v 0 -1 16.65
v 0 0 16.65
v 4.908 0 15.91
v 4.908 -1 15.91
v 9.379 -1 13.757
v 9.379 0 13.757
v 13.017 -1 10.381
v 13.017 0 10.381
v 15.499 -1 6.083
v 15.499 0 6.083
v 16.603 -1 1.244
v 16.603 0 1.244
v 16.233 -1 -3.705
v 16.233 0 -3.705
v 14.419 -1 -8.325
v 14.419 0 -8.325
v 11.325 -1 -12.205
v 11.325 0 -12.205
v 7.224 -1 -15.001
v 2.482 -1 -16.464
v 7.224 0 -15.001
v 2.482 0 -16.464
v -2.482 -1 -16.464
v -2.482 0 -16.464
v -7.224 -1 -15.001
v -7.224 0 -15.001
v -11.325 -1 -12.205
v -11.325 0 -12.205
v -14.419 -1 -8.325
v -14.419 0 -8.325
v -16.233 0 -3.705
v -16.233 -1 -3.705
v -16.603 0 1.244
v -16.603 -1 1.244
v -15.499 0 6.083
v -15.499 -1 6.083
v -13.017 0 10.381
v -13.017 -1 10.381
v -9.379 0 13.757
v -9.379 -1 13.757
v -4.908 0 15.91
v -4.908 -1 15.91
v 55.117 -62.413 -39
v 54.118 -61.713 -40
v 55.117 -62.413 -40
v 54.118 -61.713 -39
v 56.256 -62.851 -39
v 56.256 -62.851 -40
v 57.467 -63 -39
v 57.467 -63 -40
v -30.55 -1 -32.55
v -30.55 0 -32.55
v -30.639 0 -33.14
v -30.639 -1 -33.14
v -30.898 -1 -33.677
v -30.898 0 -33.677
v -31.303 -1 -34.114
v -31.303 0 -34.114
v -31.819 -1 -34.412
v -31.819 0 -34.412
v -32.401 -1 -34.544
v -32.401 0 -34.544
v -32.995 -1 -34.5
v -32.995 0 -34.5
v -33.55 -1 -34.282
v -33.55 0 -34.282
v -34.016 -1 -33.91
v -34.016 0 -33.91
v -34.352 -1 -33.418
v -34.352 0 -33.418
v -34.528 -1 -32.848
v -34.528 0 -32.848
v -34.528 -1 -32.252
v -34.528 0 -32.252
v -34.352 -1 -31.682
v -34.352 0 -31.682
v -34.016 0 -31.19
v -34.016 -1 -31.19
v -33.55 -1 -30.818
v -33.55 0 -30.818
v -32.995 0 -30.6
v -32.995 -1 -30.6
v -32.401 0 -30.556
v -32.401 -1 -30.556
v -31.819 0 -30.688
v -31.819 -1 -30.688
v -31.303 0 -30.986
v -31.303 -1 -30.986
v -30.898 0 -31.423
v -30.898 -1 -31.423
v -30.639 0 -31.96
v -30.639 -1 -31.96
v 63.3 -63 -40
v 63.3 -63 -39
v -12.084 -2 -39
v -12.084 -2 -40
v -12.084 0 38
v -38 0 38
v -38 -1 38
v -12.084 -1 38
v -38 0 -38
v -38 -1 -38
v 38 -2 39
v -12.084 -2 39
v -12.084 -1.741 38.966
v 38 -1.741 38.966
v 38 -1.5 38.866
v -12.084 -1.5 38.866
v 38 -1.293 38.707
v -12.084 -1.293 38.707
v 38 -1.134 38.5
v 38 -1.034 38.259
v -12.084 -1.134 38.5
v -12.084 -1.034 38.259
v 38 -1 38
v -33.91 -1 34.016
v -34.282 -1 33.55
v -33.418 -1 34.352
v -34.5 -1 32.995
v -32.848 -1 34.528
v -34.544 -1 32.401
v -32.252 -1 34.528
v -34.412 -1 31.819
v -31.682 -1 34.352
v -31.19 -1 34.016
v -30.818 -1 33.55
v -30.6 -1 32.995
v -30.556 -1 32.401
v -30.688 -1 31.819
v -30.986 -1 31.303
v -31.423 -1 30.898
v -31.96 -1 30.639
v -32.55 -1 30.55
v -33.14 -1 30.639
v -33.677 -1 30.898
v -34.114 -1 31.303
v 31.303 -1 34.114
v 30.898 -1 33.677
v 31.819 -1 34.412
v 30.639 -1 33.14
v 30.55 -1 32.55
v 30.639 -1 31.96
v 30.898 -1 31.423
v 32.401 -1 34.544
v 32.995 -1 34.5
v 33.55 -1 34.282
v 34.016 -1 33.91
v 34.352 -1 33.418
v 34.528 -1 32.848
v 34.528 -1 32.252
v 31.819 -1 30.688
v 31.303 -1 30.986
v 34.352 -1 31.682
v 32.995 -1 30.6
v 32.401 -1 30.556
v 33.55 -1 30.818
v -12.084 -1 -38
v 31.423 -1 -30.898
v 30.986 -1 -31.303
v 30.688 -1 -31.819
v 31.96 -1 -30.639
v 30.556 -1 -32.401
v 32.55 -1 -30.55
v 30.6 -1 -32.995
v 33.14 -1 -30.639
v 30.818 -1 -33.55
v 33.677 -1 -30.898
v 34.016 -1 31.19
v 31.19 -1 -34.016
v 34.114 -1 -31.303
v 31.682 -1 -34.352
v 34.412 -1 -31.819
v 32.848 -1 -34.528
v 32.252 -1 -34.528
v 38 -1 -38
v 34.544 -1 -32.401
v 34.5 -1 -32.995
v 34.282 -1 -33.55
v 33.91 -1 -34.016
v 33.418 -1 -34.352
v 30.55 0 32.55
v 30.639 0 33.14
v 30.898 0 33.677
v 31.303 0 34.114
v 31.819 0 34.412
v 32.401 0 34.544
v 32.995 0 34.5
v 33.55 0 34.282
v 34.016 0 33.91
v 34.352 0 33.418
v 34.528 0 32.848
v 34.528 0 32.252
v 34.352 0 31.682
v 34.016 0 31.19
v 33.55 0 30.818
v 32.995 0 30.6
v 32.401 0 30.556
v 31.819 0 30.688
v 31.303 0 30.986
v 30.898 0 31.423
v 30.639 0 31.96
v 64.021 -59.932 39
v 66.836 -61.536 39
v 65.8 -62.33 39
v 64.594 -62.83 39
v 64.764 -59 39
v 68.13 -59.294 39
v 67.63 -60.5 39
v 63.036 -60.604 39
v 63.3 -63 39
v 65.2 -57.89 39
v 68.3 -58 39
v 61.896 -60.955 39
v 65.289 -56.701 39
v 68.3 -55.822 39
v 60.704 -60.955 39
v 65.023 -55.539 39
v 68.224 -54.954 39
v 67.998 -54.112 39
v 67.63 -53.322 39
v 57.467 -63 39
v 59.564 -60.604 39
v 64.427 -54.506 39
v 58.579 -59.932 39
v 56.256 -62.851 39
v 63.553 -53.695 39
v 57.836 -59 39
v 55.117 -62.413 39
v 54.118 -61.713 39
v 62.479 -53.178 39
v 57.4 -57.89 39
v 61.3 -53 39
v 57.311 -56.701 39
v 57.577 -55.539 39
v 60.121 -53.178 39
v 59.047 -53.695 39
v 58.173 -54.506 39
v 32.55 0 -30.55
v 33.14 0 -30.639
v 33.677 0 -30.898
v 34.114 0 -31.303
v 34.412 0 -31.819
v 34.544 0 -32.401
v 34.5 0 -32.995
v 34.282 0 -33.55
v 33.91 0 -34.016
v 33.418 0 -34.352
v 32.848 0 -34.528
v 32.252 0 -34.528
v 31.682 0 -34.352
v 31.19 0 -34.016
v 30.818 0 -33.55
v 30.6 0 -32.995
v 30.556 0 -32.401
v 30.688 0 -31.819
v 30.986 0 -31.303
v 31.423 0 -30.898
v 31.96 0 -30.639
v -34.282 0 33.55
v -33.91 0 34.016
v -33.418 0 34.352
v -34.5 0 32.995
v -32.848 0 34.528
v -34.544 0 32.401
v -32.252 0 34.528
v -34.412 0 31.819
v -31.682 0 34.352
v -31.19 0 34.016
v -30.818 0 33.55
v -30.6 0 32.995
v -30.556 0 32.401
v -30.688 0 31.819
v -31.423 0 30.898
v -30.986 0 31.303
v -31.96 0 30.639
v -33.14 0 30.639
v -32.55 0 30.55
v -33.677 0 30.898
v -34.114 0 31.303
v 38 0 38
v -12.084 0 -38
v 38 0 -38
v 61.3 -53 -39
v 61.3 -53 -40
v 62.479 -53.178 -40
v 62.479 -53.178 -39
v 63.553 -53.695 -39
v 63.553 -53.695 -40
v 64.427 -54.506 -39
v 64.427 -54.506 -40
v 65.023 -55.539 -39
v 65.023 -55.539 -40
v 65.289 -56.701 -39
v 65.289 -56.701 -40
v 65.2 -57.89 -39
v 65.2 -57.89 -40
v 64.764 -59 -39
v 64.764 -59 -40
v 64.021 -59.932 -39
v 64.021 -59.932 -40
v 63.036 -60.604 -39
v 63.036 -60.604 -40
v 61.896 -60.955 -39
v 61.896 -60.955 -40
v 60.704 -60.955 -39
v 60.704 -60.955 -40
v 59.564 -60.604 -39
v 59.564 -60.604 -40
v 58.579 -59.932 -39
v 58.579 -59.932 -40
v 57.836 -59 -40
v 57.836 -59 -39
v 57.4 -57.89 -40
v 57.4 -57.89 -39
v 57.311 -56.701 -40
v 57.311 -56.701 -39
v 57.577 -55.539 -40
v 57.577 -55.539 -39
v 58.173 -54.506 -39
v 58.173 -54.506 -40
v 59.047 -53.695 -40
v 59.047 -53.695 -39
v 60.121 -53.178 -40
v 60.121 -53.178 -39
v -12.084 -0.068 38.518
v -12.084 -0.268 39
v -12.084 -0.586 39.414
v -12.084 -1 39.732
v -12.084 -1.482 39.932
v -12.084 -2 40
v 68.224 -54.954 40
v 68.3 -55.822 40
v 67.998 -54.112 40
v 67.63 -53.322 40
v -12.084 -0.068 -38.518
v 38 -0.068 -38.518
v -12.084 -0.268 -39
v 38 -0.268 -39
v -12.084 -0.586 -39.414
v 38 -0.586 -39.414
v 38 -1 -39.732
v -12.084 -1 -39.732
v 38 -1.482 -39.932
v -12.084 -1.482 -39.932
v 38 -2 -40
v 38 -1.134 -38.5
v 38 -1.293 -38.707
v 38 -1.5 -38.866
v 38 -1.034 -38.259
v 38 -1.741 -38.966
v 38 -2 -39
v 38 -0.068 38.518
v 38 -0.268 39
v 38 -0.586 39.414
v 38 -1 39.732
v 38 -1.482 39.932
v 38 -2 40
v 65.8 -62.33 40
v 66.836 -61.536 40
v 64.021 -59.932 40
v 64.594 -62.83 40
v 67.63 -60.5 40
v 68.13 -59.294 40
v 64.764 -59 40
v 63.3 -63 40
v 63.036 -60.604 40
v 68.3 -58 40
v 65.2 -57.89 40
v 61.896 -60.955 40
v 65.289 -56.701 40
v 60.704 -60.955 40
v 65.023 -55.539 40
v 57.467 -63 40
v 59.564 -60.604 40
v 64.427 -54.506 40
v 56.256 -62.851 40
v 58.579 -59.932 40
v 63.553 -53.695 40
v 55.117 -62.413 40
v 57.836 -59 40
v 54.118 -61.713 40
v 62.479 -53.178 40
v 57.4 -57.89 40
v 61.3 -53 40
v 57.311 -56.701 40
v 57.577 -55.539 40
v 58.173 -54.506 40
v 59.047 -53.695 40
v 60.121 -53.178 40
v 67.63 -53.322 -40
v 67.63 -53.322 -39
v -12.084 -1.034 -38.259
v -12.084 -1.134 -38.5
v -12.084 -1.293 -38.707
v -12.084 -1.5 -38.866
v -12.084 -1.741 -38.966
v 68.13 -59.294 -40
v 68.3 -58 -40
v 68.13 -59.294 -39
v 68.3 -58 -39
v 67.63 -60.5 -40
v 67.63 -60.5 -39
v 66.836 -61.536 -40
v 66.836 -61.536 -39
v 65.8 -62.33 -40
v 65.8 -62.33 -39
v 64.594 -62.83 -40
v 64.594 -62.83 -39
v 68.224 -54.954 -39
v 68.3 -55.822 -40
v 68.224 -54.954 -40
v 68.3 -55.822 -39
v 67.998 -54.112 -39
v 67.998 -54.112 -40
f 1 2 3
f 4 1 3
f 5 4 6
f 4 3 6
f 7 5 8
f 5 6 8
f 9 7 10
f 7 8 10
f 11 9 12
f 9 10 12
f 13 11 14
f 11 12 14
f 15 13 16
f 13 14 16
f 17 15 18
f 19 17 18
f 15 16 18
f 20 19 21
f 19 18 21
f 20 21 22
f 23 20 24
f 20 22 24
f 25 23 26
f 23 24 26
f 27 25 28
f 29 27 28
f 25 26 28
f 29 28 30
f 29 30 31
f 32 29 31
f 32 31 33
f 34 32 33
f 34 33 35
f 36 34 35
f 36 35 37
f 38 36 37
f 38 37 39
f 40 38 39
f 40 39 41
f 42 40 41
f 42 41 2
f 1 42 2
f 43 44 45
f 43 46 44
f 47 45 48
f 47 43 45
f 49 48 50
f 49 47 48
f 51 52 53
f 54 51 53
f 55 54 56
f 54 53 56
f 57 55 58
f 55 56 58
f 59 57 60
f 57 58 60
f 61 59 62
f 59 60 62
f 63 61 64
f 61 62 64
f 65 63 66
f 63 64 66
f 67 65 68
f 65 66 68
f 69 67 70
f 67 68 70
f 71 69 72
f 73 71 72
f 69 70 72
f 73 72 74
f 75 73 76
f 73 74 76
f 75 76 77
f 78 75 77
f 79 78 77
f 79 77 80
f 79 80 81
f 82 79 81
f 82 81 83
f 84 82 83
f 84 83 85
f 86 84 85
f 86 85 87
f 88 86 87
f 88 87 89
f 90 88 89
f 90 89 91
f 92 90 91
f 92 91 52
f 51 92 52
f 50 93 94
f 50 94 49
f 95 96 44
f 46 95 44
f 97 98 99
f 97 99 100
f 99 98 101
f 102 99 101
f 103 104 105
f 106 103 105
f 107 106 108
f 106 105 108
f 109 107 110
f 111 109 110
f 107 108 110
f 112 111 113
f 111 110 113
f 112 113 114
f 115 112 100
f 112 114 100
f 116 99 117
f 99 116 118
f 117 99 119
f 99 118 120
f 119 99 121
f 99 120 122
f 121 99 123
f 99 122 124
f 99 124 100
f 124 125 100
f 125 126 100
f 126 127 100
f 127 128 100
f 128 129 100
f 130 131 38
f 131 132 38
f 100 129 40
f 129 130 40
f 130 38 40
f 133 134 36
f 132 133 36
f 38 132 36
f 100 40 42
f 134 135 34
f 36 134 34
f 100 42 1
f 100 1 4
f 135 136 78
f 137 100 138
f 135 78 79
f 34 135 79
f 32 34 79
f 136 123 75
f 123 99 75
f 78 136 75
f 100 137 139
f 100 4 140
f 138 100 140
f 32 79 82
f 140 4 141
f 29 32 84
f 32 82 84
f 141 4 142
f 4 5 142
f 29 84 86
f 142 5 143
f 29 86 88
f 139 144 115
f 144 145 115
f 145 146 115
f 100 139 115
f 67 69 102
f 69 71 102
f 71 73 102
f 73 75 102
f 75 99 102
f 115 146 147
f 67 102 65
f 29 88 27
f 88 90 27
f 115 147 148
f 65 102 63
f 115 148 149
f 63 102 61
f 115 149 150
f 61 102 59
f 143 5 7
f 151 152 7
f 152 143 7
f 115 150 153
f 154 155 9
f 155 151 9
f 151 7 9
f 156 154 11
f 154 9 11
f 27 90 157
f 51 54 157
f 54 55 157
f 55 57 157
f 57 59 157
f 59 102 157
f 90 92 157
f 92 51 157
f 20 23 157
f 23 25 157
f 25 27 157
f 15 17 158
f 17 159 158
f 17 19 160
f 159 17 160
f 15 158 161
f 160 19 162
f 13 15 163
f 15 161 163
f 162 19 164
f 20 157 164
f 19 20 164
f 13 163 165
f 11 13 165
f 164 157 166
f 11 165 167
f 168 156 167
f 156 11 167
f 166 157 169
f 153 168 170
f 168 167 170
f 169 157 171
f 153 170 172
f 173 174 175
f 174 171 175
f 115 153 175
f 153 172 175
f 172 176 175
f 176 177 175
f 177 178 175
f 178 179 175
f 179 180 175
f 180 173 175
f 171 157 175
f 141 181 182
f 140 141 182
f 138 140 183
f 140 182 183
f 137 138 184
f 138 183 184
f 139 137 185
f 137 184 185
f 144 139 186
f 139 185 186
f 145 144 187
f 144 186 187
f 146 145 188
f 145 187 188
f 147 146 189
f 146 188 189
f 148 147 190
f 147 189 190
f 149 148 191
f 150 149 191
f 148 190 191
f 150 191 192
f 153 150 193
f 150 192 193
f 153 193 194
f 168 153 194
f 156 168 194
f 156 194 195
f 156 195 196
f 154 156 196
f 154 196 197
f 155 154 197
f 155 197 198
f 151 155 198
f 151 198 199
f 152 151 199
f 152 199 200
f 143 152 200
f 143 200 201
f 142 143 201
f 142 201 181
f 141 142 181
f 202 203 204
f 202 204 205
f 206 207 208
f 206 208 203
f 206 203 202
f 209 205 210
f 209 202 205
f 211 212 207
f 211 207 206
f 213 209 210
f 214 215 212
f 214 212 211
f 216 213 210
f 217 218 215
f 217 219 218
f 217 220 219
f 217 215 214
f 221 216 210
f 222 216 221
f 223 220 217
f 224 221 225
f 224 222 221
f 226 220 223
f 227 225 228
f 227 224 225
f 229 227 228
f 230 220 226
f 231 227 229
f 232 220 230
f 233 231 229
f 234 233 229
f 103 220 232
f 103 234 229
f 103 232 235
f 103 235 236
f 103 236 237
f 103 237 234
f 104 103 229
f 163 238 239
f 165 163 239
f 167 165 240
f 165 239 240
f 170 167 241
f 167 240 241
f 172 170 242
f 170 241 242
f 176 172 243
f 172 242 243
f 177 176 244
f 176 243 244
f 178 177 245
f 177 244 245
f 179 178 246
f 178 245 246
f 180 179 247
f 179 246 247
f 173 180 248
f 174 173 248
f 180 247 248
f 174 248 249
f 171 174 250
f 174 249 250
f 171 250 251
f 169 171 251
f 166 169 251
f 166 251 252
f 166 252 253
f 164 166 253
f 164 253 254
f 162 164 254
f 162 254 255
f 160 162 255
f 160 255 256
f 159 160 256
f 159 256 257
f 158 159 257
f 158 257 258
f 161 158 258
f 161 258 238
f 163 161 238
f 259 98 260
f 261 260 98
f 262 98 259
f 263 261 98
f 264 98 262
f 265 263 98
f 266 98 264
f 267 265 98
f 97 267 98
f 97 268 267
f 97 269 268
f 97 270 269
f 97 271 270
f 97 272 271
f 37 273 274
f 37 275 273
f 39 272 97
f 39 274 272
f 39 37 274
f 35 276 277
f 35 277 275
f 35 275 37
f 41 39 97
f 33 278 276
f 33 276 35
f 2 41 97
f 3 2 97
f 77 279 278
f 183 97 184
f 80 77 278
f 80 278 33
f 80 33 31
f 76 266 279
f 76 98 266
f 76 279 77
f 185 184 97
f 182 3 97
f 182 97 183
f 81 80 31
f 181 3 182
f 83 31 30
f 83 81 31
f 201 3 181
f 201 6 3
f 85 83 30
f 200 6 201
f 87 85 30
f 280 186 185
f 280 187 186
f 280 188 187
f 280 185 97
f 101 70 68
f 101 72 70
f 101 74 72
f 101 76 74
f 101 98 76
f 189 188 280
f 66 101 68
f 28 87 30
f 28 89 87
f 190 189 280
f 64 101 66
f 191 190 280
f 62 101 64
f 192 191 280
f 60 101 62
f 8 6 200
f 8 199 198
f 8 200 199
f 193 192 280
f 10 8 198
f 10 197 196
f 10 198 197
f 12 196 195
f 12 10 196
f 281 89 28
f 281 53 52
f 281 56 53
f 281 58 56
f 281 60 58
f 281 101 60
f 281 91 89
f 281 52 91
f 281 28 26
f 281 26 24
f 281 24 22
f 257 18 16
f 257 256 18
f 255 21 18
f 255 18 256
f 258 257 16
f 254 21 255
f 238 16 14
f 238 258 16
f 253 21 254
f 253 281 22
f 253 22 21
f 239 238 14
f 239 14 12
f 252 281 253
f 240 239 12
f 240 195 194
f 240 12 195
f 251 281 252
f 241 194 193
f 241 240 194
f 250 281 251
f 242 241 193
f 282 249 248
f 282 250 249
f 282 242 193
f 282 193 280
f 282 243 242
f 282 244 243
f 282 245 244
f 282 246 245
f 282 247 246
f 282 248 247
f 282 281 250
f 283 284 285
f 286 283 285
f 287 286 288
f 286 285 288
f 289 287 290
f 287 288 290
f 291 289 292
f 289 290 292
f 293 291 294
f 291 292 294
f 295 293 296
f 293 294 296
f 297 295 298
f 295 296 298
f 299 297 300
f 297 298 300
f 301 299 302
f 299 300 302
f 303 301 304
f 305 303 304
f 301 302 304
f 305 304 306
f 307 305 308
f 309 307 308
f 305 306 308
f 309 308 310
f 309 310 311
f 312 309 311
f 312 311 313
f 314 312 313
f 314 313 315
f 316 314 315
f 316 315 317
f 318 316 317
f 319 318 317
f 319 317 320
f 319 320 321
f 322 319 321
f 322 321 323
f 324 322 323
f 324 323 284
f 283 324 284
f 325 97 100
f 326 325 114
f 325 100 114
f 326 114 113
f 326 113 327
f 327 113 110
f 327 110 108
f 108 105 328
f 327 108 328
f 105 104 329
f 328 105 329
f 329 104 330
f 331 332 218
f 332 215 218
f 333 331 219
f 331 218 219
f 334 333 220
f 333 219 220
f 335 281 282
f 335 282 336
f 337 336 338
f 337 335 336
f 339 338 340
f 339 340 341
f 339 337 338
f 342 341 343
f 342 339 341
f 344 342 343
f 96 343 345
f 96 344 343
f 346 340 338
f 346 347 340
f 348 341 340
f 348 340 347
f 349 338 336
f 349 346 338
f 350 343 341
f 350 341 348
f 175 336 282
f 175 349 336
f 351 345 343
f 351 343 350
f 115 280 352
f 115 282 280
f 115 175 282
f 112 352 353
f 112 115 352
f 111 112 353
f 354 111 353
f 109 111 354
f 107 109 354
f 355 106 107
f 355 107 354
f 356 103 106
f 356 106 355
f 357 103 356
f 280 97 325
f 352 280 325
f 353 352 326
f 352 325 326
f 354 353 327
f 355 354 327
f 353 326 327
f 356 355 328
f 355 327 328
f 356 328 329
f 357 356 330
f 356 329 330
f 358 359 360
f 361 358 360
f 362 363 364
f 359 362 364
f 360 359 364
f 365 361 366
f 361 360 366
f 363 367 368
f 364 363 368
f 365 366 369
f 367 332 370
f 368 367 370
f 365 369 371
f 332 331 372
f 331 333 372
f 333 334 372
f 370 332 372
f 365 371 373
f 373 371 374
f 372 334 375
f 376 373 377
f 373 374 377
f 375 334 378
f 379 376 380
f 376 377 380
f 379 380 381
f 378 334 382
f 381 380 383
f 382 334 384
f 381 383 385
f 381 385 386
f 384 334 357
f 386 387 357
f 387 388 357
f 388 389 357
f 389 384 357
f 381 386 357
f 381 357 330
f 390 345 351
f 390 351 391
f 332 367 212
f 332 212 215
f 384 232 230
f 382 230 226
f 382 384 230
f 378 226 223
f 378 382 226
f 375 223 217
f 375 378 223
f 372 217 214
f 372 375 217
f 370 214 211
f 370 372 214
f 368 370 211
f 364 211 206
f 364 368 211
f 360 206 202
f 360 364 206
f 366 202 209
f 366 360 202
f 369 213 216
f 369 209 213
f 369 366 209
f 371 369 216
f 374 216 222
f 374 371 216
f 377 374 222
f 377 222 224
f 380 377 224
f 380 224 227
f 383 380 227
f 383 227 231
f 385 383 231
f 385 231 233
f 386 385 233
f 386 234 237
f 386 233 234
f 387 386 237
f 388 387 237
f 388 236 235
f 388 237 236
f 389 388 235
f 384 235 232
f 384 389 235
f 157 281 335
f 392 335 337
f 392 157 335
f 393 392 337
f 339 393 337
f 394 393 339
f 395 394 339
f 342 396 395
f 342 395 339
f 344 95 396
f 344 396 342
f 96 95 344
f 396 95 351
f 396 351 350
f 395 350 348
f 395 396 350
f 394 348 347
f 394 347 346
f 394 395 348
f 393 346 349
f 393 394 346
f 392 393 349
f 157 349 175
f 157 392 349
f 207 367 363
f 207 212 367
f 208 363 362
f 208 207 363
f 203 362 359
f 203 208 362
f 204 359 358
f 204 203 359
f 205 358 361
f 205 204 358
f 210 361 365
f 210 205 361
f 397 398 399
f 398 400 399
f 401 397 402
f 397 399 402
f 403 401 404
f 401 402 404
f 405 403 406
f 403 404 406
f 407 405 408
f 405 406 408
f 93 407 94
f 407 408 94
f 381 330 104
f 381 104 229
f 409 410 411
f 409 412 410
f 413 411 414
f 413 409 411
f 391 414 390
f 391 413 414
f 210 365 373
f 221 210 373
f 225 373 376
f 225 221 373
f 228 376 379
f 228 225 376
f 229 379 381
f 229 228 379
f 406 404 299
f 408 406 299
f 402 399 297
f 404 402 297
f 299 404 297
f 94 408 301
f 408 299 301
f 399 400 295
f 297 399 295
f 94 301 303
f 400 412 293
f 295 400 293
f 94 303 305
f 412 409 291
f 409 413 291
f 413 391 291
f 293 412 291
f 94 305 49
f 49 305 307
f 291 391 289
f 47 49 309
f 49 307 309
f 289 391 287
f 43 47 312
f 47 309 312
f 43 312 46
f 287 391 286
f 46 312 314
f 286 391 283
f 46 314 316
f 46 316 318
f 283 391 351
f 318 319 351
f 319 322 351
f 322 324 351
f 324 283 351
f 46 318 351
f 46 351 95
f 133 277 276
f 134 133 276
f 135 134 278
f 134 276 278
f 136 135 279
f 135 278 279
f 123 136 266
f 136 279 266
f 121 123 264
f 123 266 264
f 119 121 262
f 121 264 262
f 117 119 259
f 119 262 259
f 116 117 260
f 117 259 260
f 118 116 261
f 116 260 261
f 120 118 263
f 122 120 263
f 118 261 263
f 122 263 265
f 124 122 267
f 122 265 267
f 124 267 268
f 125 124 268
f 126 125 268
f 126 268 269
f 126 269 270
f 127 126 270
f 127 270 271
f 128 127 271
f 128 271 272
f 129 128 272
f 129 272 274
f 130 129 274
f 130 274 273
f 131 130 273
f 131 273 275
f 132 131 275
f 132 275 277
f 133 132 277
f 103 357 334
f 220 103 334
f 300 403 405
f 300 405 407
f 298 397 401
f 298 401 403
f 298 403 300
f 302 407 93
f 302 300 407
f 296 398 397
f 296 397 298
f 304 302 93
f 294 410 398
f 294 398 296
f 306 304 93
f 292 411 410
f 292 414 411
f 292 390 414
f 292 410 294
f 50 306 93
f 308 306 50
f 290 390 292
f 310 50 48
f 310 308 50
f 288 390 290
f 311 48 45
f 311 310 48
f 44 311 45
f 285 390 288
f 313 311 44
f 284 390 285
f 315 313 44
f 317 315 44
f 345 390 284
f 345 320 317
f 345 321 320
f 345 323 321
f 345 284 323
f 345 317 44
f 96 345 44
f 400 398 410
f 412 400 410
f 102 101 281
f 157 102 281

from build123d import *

# Parameters (mm, degrees)
SKETCH2_W            = 76
SKETCH2_H            = 76
BASE_FLANGE1_DEPTH   = 1
SKETCH7_R            = 2
SKETCH7_R_2          = 16.65
CUT_EXTRUDE2_DEPTH   = 10
CIRPATTERN1_COUNT    = 4
EDGE_FLANGE1_DEPTH   = 50.083809579
SKETCH14_W           = 30.3
SKETCH14_H           = 61
TAB1_DEPTH           = 1
FILLET1_R            = 5
CUT_EXTRUDE4_DEPTH   = 10
CUT_EXTRUDE5_DEPTH   = 10
FILLET2_R            = 5
SKETCH19_R           = 4
CUT_EXTRUDE6_DEPTH   = 10
FILLET1_OF_MIRROR1_R = 5
FILLET2_OF_MIRROR1_R = 5


# Sheet-metal steps are written as plain solids
with BuildPart() as part:
    # Sketch2 → Base-Flange1 (new body)
    with BuildSketch(Plane(origin=(0, 0, 0), x_dir=(1, 0, 0), z_dir=(0, 1, 0))):
        Rectangle(SKETCH2_W, SKETCH2_H)
    extrude(amount=-BASE_FLANGE1_DEPTH)

    # Sketch7 → Cut-Extrude2 (cut)
    with BuildSketch(Plane(origin=(0, 0, 0), x_dir=(1, 0, 0), z_dir=(0, 1, 0))):
        with Locations(Location((32.55, 32.55, 0), (0, 0, 270))):
            Circle(SKETCH7_R)
        with Locations(Location((0, 0, 0), (0, 0, 270))):
            Circle(SKETCH7_R_2)
    cut_extrude2 = extrude(amount=-CUT_EXTRUDE2_DEPTH, mode=Mode.SUBTRACT)

    # CirPattern1: Cut-Extrude2 ×4 about axis
    cirpattern1_axis = Axis((0, 0, 0), (0, 1, 0))
    for i in range(1, CIRPATTERN1_COUNT):
        add(cut_extrude2.rotate(cirpattern1_axis, i * 360 / CIRPATTERN1_COUNT), mode=Mode.SUBTRACT)

    # Edge-Flange1 section (across the edge) → Edge-Flange1 (add)
    with BuildSketch(Plane(origin=(-12.083809579, -1, -39), x_dir=(0, 0, 1), z_dir=(1, 0, 0))):
        with BuildLine():
            Line((-1, 1), (-1, 62))
            Line((-1, 62), (0, 62))
            Line((0, 62), (0, 1))
            ThreePointArc((0, 1), (0.292893219, 0.292893219), (1, 0))
            Line((1, 0), (1, -1))
            ThreePointArc((1, -1), (-0.414213562, -0.414213562), (-1, 1))
        make_face()
    edge_flange1 = extrude(amount=EDGE_FLANGE1_DEPTH)

    # Sketch14 → Tab1 (add)
    with BuildSketch(Plane(origin=(0, 0, -40), x_dir=(-1, 0, 0), z_dir=(0, 0, -1))):
        with Locations((-53.15, -32.5)):
            Rectangle(SKETCH14_W, SKETCH14_H)
    tab1 = extrude(amount=-TAB1_DEPTH)

    # Fillet1
    fillet1_edges = [part.edges().sort_by_distance(p)[0] for p in [
        (68.3, -63, -39.5),
    ]]
    fillet(fillet1_edges, radius=FILLET1_R)

    # Sketch20 → Cut-Extrude4 (cut)
    with BuildSketch(Plane(origin=(0, 0, -40), x_dir=(-1, 0, 0), z_dir=(0, 0, -1))):
        Polygon((-38, -2), (-68.3, -54.482600826), (-68.3, -2), align=None)
    cut_extrude4 = extrude(amount=-CUT_EXTRUDE4_DEPTH, mode=Mode.SUBTRACT)

    # Sketch21 → Cut-Extrude5 (cut)
    with BuildSketch(Plane(origin=(0, 0, -40), x_dir=(-1, 0, 0), z_dir=(0, 0, -1))):
        Polygon((12.083809579, -2), (-55.544985759, -63), (12.083809579, -63), align=None)
    cut_extrude5 = extrude(amount=-CUT_EXTRUDE5_DEPTH, mode=Mode.SUBTRACT)

    # Fillet2
    fillet2_edges = [part.edges().sort_by_distance(p)[0] for p in [
        (55.544985759, -63, -39.5),
        (68.3, -54.482600826, -39.5),
    ]]
    fillet(fillet2_edges, radius=FILLET2_R)

    # Sketch19 → Cut-Extrude6 (cut)
    with BuildSketch(Plane(origin=(0, 0, -40), x_dir=(-1, 0, 0), z_dir=(0, 0, -1))):
        with Locations(Location((-61.3, -57, 0), (0, 0, 90))):
            Circle(SKETCH19_R)
    cut_extrude6 = extrude(amount=-CUT_EXTRUDE6_DEPTH, mode=Mode.SUBTRACT)

    # Mirror1: Edge-Flange1, Tab1, Cut-Extrude4, Cut-Extrude5, Cut-Extrude6 across plane
    add(edge_flange1.mirror(Plane.XY))
    add(tab1.mirror(Plane.XY))
    add(cut_extrude4.mirror(Plane.XY), mode=Mode.SUBTRACT)
    add(cut_extrude5.mirror(Plane.XY), mode=Mode.SUBTRACT)
    add(cut_extrude6.mirror(Plane.XY), mode=Mode.SUBTRACT)

    # Fillet1 of Mirror1
    fillet1_of_mirror1_edges = [part.edges().sort_by_distance(p)[0] for p in [
        (68.3, -63, 39.5),
    ]]
    fillet(fillet1_of_mirror1_edges, radius=FILLET1_OF_MIRROR1_R)

    # Fillet2 of Mirror1
    fillet2_of_mirror1_edges = [part.edges().sort_by_distance(p)[0] for p in [
        (55.544985759, -63, 39.5),
        (68.3, -54.482600826, 39.5),
    ]]
    fillet(fillet2_of_mirror1_edges, radius=FILLET2_OF_MIRROR1_R)


solid = part.part
